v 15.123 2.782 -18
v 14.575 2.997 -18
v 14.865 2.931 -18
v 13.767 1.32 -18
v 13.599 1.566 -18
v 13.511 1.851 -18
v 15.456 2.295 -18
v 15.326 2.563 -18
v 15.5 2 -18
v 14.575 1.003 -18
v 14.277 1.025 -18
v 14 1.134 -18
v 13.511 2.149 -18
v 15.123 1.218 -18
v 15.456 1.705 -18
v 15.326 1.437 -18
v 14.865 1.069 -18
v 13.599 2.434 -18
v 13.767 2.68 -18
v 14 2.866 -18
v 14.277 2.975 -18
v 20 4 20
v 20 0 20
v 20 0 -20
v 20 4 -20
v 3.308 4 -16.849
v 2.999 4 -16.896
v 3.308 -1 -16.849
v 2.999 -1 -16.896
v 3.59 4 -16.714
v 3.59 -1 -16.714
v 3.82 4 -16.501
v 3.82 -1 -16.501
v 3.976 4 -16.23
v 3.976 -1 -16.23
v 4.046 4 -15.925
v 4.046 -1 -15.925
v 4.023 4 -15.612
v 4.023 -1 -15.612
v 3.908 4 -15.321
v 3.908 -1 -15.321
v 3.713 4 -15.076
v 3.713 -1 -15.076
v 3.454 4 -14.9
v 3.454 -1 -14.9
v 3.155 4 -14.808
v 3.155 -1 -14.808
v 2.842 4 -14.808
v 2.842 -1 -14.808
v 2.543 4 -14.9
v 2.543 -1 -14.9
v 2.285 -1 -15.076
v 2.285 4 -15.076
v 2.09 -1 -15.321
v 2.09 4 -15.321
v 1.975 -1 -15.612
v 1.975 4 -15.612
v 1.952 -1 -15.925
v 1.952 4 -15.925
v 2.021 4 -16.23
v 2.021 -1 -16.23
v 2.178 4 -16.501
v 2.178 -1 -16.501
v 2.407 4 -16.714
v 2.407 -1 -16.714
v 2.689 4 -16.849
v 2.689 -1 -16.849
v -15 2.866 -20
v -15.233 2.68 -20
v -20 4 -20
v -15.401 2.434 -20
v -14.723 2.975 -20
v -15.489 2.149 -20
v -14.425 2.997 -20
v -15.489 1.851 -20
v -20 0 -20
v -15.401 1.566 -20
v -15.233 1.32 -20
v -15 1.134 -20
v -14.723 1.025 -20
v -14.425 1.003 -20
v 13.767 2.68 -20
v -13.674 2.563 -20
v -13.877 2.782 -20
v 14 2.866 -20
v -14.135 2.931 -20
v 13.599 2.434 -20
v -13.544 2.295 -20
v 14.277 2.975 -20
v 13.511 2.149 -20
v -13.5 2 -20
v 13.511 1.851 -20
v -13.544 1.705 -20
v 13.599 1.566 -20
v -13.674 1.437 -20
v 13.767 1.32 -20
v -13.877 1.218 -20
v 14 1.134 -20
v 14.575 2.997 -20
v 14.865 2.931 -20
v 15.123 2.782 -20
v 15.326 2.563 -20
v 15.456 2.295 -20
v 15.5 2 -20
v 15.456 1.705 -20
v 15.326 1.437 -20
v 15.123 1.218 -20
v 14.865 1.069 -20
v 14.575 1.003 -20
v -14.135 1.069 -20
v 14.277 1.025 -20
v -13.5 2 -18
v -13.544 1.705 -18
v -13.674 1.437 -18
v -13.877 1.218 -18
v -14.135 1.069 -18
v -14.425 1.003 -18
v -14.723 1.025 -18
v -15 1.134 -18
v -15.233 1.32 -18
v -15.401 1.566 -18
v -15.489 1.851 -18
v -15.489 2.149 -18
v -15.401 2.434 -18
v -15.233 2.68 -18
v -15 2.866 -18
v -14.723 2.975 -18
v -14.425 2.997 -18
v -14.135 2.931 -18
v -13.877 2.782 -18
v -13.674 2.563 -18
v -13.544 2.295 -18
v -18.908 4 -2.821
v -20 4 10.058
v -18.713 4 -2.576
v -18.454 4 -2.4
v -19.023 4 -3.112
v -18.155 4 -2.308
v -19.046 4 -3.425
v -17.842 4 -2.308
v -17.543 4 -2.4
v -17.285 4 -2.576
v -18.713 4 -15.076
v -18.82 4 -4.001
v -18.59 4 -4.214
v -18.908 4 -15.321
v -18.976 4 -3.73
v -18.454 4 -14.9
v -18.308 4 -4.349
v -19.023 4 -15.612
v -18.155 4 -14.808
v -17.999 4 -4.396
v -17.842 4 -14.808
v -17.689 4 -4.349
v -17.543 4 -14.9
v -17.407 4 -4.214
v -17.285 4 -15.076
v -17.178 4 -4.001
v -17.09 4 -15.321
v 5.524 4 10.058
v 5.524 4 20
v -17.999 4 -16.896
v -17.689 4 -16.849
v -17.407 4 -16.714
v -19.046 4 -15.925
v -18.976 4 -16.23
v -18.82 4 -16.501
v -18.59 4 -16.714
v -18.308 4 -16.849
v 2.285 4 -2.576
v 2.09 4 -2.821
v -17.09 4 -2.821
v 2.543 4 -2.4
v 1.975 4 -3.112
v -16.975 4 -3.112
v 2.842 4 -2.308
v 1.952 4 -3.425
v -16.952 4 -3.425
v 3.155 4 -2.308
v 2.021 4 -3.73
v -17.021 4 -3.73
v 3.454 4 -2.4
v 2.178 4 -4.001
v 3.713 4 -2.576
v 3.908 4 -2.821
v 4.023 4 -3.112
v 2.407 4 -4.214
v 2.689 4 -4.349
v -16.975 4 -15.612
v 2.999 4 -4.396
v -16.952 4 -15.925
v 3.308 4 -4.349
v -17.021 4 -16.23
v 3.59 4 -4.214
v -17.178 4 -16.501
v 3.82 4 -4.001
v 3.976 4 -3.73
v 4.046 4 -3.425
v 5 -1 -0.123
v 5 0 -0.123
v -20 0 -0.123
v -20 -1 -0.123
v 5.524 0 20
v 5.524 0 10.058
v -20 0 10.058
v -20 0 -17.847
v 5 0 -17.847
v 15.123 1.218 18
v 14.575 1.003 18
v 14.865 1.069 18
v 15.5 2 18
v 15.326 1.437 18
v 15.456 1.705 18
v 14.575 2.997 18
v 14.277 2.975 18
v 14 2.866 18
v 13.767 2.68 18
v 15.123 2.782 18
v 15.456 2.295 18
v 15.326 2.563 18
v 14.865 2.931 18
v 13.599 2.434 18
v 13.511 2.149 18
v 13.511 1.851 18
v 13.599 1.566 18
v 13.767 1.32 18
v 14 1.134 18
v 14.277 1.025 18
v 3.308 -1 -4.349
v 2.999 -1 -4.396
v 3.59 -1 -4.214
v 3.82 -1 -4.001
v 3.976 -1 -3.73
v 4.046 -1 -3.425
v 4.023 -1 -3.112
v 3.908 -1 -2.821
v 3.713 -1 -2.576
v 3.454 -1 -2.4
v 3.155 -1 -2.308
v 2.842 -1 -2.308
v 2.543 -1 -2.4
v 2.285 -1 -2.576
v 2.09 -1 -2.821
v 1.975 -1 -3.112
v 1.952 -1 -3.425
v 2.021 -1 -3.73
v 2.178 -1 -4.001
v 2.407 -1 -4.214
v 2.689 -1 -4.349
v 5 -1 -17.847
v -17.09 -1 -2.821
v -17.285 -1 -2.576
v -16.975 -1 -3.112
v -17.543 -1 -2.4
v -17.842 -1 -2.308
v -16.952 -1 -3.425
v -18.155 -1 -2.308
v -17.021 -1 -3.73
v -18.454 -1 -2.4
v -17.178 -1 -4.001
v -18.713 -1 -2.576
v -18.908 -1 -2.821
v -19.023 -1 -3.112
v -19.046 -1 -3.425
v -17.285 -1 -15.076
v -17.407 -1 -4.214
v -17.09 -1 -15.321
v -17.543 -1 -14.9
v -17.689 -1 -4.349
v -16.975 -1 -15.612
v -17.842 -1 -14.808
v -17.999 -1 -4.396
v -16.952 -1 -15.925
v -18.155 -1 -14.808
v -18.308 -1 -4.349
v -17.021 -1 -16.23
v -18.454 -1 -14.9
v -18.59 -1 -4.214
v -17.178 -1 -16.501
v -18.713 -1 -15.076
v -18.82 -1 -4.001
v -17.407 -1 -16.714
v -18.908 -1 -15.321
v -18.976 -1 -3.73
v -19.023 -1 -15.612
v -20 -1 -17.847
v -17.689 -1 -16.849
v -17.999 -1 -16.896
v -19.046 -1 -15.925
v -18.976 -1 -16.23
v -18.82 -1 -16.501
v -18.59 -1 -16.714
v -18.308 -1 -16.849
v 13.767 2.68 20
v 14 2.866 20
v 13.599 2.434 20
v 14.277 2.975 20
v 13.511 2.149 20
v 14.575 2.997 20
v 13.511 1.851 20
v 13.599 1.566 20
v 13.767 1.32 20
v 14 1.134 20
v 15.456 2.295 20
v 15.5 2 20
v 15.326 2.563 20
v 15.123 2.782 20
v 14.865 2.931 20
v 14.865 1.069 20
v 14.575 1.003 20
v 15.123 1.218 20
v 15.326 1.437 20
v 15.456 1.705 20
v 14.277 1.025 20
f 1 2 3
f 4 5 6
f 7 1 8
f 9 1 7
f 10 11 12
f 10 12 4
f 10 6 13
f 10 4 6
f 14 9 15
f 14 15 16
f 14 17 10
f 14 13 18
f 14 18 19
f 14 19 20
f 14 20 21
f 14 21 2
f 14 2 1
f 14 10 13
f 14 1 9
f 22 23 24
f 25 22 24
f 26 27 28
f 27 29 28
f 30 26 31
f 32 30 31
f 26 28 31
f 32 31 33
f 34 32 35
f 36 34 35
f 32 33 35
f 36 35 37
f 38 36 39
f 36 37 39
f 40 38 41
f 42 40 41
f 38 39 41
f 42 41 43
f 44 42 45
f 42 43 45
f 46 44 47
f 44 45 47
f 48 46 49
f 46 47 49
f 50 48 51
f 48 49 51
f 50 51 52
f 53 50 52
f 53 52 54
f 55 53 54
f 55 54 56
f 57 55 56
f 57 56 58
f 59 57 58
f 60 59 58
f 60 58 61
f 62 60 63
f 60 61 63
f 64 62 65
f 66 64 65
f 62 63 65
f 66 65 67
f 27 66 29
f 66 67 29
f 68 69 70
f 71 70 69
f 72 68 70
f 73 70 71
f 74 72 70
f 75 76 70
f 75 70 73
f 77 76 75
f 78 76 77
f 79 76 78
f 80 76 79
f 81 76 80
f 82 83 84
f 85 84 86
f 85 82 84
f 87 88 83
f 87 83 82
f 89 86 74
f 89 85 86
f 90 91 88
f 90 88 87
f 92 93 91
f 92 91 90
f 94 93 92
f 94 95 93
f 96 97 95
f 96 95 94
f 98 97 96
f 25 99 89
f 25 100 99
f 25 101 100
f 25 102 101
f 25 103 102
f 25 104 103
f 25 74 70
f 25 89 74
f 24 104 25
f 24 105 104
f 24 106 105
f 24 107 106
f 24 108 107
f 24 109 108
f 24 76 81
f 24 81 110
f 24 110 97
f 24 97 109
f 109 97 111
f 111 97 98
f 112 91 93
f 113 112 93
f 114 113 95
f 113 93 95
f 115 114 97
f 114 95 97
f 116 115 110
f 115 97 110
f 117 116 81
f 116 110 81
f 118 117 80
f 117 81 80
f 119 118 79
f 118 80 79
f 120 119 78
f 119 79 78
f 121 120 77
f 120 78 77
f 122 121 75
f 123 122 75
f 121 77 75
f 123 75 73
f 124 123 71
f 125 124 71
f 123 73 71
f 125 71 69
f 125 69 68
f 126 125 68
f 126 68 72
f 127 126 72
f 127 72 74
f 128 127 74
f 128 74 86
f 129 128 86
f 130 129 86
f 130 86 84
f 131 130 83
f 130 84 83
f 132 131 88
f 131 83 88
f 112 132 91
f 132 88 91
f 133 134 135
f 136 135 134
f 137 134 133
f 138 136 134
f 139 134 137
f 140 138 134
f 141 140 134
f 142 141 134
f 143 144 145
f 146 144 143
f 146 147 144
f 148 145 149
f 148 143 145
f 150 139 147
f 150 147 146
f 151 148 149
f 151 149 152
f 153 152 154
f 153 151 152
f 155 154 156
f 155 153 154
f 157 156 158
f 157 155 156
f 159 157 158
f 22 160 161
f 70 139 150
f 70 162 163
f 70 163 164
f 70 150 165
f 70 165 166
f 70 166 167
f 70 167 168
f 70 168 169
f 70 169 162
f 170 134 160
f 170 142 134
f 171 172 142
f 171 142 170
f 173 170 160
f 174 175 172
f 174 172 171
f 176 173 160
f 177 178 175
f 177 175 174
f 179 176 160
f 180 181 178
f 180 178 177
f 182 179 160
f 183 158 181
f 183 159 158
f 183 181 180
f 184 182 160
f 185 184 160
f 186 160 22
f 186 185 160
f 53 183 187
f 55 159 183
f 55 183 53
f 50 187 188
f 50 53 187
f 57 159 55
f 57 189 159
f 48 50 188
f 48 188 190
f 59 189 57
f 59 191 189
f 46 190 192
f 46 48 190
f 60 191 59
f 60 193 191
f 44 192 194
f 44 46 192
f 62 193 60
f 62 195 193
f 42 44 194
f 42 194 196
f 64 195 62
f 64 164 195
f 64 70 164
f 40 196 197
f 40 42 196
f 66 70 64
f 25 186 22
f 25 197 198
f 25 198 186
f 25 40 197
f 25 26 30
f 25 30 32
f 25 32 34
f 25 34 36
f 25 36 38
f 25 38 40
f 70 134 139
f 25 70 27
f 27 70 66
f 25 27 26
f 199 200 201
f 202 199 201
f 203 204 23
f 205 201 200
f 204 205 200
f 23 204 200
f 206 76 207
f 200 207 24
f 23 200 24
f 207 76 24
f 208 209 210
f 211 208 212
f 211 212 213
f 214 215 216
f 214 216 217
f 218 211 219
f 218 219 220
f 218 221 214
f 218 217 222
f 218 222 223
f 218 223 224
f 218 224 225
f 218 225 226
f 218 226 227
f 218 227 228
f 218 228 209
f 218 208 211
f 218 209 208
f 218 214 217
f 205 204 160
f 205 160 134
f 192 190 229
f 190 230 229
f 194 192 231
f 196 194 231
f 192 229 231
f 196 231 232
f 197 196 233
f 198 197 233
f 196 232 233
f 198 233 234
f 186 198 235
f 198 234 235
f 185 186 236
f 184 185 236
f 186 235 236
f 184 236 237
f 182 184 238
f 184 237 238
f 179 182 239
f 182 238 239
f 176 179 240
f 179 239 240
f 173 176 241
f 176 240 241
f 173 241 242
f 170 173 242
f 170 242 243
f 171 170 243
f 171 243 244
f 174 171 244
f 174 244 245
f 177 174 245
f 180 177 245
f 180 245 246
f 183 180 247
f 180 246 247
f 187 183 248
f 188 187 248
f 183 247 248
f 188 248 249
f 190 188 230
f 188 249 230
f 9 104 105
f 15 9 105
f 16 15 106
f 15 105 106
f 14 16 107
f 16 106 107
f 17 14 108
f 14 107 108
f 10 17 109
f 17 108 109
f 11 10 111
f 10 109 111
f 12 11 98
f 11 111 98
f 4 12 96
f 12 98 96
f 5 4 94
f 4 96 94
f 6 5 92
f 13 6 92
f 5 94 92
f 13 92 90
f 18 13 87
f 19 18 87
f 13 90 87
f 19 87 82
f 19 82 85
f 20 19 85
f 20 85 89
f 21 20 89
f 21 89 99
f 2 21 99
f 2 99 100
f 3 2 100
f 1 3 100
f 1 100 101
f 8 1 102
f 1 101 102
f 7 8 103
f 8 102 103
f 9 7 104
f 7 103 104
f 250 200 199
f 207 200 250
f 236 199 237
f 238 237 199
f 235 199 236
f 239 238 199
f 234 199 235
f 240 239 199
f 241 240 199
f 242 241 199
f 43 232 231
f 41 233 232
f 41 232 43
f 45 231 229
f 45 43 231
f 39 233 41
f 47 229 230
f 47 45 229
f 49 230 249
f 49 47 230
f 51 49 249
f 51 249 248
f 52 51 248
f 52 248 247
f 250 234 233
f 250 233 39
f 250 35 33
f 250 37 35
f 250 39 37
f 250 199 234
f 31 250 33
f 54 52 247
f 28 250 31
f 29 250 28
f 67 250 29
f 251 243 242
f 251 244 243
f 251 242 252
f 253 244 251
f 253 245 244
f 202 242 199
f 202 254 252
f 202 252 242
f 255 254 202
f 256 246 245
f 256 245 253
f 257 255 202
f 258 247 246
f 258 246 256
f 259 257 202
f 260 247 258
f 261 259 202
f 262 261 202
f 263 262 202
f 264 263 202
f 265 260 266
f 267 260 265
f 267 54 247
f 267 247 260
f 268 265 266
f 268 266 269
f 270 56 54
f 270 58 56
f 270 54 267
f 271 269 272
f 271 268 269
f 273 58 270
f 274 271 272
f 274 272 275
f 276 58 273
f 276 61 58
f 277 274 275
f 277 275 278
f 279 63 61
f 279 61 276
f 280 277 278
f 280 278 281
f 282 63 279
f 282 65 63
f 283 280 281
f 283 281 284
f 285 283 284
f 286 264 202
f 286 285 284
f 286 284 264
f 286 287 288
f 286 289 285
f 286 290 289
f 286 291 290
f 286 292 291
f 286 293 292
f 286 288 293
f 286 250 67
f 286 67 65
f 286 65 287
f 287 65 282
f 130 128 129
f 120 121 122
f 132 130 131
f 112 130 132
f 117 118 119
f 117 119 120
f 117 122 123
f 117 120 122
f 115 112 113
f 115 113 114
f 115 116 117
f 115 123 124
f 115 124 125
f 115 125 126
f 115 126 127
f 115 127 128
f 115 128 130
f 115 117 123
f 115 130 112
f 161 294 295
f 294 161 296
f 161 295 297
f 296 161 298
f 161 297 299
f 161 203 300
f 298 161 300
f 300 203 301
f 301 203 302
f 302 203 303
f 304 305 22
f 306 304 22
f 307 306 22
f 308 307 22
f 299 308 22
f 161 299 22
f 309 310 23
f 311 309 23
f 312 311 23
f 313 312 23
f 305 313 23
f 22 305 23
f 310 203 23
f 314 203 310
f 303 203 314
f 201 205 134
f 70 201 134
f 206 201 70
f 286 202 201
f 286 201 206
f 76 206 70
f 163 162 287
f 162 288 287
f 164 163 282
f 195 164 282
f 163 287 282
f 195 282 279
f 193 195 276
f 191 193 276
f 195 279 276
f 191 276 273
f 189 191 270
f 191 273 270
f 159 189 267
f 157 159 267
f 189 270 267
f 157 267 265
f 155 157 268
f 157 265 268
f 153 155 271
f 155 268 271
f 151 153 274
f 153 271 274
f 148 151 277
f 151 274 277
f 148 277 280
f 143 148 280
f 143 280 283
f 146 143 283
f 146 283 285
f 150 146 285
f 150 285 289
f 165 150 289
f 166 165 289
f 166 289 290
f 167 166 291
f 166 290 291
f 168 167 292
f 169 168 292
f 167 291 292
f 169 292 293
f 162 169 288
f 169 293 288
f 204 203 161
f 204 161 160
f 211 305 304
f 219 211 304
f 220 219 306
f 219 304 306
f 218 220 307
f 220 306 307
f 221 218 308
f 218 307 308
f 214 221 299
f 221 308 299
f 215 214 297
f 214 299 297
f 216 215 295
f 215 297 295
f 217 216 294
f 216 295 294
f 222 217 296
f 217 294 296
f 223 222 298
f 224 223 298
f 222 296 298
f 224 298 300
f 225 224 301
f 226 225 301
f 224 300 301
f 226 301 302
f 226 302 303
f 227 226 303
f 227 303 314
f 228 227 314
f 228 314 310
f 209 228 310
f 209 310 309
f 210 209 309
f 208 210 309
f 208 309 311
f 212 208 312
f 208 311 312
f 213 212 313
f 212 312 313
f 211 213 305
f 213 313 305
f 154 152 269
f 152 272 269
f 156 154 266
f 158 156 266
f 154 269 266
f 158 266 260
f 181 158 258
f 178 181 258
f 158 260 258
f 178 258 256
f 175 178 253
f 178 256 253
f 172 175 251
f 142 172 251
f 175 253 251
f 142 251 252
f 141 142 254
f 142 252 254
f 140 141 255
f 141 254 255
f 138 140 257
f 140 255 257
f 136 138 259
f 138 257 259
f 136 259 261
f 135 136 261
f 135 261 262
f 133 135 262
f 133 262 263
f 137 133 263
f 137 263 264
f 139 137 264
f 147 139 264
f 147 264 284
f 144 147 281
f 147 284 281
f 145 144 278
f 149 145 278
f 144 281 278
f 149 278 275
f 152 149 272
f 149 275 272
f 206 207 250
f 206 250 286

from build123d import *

# Parameters (mm, degrees)
SKETCH1_W           = 40
SKETCH1_H           = 40
BOSS_EXTRUDE1_DEPTH = 4
SKETCH4_R           = 1
CUT_EXTRUDE2_DEPTH  = 2
SKETCH5_R           = 1
CUT_EXTRUDE3_DEPTH  = 2
SKETCH6_W           = 25
SKETCH6_H           = 17.723883745
SKETCH6_R           = 1.05
BOSS_EXTRUDE3_DEPTH = 1
SKETCH8_R           = 1.05
CUT_EXTRUDE4_DEPTH  = 29.722813233
SKETCH9_W           = 25.523793116
SKETCH9_H           = 9.941729438
CUT_EXTRUDE5_DEPTH  = 29.565713714


with BuildPart() as part:
    # Sketch1 → Boss-Extrude1 (new body)
    with BuildSketch(Plane(origin=(0, 0, 0), x_dir=(1, 0, 0), z_dir=(0, 1, 0))):
        Rectangle(SKETCH1_W, SKETCH1_H)
    extrude(amount=BOSS_EXTRUDE1_DEPTH)

    # Sketch4 → Cut-Extrude2 (cut)
    with BuildSketch(Plane.XY.offset(20)):
        with Locations((-14.5, 2)):
            Circle(SKETCH4_R)
        with Locations((14.5, 2)):
            Circle(SKETCH4_R)
    extrude(amount=-CUT_EXTRUDE2_DEPTH, mode=Mode.SUBTRACT)

    # Sketch5 → Cut-Extrude3 (cut)
    with BuildSketch(Plane(origin=(0, 0, -20), x_dir=(-1, 0, 0), z_dir=(0, 0, -1))):
        with Locations(Location((-14.5, 2, 0), (0, 0, 180))):
            Circle(SKETCH5_R)
        with Locations(Location((14.5, 2, 0), (0, 0, 180))):
            Circle(SKETCH5_R)
    extrude(amount=-CUT_EXTRUDE3_DEPTH, mode=Mode.SUBTRACT)

    # Sketch6 → Boss-Extrude3 (add)
    with BuildSketch(Plane(origin=(0, 0, 0), x_dir=(-1, 0, 0), z_dir=(0, -1, 0))):
        with Locations((7.5, 8.985238628)):
            Rectangle(SKETCH6_W, SKETCH6_H)
        with Locations(Location((17.998887809, 15.84606831, 0), (0, 0, 90))):
            Circle(SKETCH6_R, mode=Mode.SUBTRACT)
        with Locations(Location((-2.998887809, 15.84606831, 0), (0, 0, 90))):
            Circle(SKETCH6_R, mode=Mode.SUBTRACT)
        with Locations(Location((-2.998887809, 3.34606831, 0), (0, 0, 90))):
            Circle(SKETCH6_R, mode=Mode.SUBTRACT)
        with Locations(Location((17.998887809, 3.34606831, 0), (0, 0, 90))):
            Circle(SKETCH6_R, mode=Mode.SUBTRACT)
    extrude(amount=BOSS_EXTRUDE3_DEPTH)

    # Sketch8 → Cut-Extrude4 (cut, through all)
    with BuildSketch(Plane.XZ.offset(1)):
        with Locations(Location((-17.998887809, -15.84606831, 0), (0, 0, 270))):
            Circle(SKETCH8_R)
        with Locations(Location((2.998887809, -15.84606831, 0), (0, 0, 270))):
            Circle(SKETCH8_R)
        with Locations(Location((2.998887809, -3.34606831, 0), (0, 0, 270))):
            Circle(SKETCH8_R)
        with Locations(Location((-17.998887809, -3.34606831, 0), (0, 0, 270))):
            Circle(SKETCH8_R)
    extrude(amount=-CUT_EXTRUDE4_DEPTH, mode=Mode.SUBTRACT)

    # Sketch9 → Cut-Extrude5 (cut, through all)
    with BuildSketch(Plane(origin=(0, 0, 0), x_dir=(-1, 0, 0), z_dir=(0, -1, 0))):
        with Locations((7.238103442, -15.029135281)):
            Rectangle(SKETCH9_W, SKETCH9_H)
    extrude(amount=-CUT_EXTRUDE5_DEPTH, mode=Mode.SUBTRACT)


solid = part.part
